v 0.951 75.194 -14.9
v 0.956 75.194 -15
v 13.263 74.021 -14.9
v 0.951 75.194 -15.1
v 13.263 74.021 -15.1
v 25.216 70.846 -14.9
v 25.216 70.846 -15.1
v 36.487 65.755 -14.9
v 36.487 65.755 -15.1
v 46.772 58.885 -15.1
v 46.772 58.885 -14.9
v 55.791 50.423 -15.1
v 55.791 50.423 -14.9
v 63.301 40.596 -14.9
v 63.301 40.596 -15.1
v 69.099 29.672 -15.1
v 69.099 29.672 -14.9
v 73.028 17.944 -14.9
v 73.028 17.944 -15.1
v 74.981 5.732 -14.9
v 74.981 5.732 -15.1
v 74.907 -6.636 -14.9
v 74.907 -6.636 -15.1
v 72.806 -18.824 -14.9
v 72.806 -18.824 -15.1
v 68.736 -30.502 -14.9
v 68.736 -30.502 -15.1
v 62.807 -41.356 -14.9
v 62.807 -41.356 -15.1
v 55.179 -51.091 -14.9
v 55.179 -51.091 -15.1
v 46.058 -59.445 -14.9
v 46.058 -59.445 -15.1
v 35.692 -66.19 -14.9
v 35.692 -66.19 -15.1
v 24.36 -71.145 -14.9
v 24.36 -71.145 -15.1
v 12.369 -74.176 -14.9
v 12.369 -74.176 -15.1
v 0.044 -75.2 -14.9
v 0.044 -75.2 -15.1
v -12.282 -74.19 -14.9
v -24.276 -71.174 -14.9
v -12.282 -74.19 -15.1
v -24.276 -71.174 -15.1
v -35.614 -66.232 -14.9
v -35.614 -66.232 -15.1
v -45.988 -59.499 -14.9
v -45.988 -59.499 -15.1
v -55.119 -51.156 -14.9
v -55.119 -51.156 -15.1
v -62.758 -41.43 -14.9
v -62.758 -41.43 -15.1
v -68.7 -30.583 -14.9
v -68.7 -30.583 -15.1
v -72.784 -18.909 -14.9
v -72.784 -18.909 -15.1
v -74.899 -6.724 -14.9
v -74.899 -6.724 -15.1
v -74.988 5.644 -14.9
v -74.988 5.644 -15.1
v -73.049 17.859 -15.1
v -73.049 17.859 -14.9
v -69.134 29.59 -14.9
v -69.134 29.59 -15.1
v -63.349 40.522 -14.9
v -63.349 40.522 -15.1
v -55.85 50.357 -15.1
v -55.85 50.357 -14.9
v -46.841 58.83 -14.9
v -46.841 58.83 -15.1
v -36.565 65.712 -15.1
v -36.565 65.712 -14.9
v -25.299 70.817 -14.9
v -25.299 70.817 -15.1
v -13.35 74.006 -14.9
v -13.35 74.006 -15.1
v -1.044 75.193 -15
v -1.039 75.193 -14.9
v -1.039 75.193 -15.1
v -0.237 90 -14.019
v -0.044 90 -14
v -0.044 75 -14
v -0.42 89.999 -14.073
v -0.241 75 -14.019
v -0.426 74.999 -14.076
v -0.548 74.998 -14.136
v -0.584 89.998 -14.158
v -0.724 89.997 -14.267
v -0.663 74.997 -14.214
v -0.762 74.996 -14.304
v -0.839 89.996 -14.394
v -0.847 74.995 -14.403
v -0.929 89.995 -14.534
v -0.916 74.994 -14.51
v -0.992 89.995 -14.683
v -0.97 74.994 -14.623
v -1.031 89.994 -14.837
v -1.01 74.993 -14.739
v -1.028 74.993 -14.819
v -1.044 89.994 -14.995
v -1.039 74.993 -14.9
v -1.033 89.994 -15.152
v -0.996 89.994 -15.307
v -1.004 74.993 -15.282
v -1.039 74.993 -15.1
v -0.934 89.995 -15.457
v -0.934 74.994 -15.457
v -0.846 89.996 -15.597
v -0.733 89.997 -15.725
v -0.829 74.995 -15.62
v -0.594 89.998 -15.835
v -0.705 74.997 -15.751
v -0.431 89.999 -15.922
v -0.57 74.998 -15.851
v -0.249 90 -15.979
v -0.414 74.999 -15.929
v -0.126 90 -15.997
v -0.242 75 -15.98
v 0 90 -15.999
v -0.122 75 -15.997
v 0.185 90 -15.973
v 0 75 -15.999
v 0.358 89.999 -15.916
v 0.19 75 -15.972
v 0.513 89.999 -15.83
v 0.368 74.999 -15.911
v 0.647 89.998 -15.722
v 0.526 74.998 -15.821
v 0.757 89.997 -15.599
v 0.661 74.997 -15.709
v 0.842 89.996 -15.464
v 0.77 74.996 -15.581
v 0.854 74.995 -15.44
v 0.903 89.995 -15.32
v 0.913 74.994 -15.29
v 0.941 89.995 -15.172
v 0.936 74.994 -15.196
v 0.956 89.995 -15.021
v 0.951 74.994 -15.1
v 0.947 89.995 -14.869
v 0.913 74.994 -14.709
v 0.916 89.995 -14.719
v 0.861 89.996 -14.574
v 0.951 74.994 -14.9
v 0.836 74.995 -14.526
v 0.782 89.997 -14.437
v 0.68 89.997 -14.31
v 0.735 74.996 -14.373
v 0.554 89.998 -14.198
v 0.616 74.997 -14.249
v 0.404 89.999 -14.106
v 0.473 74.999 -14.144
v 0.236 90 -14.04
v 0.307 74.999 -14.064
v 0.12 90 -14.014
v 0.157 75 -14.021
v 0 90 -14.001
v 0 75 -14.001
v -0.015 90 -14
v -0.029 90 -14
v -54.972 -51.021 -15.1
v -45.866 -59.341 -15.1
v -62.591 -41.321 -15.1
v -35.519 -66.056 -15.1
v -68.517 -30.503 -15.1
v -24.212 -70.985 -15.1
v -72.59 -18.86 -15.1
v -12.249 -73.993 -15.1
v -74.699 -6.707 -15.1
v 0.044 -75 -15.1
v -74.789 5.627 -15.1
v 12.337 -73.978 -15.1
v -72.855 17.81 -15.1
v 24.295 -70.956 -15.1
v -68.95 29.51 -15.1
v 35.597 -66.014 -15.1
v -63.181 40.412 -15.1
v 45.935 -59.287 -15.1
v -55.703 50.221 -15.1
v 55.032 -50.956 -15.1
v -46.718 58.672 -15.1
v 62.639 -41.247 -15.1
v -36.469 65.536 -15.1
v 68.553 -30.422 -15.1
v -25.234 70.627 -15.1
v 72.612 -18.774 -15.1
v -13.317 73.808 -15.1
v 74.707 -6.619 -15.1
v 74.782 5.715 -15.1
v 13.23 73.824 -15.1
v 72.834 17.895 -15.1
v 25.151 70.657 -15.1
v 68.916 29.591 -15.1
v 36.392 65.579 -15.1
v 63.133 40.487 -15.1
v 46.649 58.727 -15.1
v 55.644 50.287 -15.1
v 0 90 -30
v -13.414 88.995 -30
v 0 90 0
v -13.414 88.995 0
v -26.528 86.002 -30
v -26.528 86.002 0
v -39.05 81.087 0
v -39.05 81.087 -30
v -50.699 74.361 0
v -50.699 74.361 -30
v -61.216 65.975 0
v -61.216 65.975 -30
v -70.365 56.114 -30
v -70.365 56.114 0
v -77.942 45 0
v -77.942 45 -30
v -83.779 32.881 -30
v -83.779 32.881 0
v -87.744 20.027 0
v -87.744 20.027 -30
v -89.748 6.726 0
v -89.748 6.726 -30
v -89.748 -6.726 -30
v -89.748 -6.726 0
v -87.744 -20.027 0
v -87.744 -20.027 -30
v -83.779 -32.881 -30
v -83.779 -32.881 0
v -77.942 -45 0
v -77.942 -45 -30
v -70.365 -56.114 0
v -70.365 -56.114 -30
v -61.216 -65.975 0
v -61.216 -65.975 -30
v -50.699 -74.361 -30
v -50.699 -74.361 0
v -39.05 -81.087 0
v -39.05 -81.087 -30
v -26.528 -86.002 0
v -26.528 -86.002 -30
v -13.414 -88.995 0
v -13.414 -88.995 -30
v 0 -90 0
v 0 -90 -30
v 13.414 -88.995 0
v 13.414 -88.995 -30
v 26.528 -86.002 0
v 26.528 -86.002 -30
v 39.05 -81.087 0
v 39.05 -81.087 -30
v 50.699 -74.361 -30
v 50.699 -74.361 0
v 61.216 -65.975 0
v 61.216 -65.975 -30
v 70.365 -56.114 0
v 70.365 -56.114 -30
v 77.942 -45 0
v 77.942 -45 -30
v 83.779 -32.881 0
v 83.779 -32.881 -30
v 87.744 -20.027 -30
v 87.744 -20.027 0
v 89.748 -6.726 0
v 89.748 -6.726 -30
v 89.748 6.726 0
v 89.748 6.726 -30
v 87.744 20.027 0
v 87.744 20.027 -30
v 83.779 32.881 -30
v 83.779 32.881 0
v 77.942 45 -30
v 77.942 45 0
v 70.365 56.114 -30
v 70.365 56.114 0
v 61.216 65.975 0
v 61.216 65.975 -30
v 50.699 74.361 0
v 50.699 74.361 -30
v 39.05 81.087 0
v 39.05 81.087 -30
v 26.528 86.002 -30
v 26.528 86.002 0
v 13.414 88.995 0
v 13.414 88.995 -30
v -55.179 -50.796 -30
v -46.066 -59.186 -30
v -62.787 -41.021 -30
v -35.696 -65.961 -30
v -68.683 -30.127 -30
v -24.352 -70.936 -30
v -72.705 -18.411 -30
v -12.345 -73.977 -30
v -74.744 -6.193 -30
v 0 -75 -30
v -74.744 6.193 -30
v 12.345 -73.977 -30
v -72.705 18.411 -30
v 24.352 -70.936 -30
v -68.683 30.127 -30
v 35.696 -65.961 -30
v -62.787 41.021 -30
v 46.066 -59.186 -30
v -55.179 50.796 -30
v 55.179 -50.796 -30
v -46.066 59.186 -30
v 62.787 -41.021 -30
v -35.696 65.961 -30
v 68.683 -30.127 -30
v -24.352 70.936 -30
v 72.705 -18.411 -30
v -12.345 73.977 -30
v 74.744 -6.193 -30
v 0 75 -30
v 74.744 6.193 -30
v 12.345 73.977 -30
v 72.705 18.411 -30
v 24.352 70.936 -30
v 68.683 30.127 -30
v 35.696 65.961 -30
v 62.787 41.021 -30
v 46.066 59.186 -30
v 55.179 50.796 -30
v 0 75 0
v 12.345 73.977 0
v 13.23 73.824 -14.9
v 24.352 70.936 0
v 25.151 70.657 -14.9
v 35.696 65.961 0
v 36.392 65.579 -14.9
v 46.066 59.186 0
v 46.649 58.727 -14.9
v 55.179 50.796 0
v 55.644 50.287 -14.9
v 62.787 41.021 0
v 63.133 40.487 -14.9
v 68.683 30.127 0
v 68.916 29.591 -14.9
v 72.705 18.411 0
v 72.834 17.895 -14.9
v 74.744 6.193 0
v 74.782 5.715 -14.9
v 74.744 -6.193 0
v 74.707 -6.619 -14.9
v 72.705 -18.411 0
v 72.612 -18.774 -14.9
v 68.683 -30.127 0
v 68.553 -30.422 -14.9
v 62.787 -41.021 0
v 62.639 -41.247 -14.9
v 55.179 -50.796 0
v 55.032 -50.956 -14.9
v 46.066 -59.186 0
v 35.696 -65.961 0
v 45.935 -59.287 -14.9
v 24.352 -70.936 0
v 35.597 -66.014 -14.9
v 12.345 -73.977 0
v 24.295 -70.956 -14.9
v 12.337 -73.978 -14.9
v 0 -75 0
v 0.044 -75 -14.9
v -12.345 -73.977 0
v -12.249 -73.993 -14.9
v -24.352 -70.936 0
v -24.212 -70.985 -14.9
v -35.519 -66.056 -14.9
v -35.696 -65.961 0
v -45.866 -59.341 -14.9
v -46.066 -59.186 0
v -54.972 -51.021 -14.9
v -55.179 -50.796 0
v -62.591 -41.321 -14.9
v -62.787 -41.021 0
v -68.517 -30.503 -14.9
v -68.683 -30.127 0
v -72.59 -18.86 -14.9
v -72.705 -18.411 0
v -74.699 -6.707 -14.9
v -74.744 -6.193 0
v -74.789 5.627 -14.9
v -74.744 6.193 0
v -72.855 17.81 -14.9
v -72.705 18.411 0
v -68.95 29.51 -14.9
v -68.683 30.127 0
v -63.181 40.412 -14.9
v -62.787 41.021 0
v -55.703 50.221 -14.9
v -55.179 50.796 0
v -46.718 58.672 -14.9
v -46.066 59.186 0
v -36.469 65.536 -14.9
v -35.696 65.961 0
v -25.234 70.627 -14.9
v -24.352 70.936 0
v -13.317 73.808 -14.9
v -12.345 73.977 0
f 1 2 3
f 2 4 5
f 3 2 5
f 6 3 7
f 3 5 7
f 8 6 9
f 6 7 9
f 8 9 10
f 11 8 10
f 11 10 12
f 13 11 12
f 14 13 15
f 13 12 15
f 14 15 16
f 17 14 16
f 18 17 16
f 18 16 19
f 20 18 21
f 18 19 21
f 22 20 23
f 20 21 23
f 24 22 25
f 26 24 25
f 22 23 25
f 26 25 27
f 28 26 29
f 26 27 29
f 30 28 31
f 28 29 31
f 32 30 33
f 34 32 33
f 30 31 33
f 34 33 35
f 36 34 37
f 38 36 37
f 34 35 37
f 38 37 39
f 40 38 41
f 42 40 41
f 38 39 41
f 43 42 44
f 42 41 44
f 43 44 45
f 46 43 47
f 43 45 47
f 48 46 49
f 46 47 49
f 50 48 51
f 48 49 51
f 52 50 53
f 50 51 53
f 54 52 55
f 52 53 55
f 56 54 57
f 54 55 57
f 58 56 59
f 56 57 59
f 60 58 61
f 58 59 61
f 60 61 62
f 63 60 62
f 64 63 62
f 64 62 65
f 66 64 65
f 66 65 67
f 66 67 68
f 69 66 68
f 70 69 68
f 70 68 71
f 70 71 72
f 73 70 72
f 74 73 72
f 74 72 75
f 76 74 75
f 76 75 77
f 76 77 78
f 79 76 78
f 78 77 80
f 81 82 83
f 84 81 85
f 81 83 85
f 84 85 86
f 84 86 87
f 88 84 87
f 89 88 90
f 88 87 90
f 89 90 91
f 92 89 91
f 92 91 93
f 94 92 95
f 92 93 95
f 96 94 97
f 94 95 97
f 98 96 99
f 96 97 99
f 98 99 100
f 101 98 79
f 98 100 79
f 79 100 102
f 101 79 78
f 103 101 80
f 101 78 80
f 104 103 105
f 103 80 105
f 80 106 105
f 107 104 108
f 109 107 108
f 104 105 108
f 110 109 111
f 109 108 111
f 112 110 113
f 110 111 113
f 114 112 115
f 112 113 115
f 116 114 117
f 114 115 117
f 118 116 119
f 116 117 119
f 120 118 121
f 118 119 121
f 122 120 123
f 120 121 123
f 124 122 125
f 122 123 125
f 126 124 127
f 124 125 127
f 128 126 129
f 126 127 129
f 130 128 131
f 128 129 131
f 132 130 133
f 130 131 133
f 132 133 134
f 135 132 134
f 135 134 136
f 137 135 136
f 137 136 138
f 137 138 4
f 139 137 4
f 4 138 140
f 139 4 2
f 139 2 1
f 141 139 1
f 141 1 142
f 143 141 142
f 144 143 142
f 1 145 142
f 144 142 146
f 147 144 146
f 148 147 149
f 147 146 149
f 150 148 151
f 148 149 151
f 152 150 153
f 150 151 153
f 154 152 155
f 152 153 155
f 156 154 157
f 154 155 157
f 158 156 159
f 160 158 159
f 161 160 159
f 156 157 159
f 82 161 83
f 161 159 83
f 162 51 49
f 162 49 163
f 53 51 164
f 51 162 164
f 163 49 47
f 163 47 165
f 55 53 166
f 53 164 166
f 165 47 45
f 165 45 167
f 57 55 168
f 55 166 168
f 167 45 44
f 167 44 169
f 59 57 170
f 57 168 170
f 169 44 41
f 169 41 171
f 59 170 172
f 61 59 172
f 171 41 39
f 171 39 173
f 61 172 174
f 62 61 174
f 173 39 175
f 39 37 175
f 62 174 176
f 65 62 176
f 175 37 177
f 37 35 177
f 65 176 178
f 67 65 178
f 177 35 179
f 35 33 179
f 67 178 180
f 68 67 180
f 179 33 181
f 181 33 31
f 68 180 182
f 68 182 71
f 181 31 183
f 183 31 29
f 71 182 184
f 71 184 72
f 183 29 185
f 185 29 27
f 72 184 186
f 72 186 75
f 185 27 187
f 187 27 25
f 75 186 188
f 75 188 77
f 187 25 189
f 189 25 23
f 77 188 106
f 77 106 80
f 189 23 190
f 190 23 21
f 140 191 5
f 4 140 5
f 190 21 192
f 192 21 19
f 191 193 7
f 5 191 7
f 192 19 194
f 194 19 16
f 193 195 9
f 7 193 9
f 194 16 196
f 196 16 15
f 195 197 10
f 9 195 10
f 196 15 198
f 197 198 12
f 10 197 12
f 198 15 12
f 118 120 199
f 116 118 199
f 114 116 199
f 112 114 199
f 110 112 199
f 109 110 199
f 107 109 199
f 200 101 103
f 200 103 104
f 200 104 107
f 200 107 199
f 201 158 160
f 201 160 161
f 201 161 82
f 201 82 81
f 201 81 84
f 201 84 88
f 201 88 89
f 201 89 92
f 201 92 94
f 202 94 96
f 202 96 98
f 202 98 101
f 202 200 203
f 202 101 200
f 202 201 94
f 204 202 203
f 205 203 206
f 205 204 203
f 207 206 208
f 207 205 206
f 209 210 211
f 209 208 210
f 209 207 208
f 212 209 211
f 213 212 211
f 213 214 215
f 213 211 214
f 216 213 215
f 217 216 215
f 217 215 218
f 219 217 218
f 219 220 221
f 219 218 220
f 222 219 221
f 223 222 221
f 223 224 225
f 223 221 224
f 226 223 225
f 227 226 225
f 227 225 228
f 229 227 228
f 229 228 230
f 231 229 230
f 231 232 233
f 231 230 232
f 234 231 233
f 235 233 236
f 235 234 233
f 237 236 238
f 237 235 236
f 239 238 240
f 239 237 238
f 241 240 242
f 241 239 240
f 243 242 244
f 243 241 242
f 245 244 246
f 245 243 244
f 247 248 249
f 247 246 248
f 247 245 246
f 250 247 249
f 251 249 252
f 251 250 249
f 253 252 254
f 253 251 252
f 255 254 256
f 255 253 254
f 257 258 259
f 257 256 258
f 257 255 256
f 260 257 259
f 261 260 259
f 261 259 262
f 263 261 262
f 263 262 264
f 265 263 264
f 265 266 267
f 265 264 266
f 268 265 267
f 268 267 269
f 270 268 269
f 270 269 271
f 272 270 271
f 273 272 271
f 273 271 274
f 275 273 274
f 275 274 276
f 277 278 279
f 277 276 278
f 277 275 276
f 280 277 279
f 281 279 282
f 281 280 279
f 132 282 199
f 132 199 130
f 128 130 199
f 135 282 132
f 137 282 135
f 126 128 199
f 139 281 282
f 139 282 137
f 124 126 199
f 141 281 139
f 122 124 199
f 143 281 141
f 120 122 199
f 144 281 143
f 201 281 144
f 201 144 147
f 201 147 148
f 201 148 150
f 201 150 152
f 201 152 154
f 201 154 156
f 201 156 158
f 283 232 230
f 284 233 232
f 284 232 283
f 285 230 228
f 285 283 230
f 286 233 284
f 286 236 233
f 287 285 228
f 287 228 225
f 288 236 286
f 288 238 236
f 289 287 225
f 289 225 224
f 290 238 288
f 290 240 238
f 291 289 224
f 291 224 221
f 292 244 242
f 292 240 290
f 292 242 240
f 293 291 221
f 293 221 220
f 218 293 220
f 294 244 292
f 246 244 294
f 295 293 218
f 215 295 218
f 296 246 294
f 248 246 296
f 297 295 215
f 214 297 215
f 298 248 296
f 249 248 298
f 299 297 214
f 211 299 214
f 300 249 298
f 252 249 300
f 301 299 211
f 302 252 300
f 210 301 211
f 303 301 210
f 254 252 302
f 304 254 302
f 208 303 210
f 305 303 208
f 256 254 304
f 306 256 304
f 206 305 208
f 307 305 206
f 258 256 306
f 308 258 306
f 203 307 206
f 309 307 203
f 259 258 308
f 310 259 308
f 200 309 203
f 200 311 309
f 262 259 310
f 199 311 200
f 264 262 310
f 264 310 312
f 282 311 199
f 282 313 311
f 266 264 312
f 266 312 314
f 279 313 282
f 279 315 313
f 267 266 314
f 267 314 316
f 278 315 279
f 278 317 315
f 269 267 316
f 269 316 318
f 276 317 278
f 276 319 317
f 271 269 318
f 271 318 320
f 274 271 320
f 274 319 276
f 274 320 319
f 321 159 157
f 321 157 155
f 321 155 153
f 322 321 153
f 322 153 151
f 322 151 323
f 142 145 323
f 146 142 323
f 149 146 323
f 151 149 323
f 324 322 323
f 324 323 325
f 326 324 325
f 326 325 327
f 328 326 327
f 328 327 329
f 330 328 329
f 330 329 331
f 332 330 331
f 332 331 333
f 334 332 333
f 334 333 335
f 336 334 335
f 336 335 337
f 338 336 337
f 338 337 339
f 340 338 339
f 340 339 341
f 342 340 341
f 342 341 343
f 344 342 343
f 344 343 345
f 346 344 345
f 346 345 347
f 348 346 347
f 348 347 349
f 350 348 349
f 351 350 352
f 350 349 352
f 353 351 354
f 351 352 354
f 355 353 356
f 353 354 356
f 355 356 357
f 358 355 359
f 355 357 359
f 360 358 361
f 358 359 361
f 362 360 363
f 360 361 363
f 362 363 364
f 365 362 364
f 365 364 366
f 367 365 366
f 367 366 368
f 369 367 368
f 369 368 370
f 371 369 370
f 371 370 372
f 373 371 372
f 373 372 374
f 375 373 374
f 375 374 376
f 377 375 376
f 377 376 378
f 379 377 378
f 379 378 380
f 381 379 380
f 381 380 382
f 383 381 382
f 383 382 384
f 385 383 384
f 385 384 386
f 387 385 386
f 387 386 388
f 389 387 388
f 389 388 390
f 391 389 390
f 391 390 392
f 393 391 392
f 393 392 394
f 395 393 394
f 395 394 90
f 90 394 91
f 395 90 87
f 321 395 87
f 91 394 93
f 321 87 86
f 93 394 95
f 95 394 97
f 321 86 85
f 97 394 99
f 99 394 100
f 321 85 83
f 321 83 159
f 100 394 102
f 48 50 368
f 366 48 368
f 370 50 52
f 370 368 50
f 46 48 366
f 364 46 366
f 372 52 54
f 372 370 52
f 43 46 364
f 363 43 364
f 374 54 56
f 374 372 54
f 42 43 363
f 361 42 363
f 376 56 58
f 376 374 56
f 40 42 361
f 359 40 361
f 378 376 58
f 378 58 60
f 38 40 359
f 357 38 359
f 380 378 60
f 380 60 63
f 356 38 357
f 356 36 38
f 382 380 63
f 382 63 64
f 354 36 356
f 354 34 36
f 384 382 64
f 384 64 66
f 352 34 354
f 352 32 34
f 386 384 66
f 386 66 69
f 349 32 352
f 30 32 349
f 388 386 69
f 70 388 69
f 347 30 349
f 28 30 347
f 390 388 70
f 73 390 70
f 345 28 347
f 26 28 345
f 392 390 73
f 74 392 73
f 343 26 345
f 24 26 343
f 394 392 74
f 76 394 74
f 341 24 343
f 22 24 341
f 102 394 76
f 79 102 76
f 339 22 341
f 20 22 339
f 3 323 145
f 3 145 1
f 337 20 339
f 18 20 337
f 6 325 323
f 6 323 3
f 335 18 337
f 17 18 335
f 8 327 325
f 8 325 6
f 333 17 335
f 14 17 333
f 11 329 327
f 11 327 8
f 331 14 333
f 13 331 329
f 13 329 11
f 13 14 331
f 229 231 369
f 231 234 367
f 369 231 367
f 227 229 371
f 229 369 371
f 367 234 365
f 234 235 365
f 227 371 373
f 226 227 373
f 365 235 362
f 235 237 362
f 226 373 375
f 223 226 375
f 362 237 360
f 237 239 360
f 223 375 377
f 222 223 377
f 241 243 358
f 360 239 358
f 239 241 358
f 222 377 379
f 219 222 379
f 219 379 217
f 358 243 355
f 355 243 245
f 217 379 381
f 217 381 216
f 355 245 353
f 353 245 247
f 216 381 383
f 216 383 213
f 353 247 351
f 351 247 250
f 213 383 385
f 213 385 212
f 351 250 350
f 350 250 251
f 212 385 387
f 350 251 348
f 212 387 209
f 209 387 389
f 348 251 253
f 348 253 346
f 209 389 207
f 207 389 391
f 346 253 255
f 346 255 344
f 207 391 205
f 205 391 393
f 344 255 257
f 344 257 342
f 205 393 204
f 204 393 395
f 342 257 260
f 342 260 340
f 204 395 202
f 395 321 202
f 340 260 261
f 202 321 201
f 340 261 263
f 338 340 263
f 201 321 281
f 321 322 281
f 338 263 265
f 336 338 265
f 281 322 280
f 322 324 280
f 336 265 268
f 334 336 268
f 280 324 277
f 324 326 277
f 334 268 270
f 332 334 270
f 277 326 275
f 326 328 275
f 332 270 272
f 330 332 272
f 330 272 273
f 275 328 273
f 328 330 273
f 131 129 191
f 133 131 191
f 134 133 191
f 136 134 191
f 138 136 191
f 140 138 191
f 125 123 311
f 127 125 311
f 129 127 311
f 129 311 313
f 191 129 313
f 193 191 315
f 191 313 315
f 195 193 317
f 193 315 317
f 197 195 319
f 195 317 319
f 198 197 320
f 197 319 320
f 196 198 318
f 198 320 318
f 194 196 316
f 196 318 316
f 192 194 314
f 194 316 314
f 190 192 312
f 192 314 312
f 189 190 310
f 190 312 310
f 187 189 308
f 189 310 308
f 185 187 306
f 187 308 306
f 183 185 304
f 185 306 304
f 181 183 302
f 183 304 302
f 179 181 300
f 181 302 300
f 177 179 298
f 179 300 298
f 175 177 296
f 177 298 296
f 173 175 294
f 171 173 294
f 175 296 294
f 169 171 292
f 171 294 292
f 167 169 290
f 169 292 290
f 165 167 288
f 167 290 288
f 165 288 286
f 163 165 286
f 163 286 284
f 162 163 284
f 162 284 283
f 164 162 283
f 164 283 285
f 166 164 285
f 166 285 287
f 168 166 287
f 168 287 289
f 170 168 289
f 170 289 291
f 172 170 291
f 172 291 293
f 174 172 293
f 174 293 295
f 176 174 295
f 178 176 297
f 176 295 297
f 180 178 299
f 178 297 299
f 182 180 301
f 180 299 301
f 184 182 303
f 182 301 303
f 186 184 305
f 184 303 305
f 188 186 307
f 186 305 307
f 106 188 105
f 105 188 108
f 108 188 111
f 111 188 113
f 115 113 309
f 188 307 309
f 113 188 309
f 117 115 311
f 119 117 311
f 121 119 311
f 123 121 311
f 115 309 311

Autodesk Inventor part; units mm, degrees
ref_plane "YZ Plane" through (0, 0, 0) normal (1, 0, 0) x (0, 1, 0)
ref_plane "XY Plane" through (0, 0, 0) normal (0, 0, 1) x (1, 0, 0)
sketch "Sketch3" plane through (0, 0, 0) normal (1, 0, 0) x (0, 1, 0)
  line L0 (0, 0) -> (0, -30)
  line L1 (0, -30) -> (90, -30)
  line L2 (90, -30) -> (90, 0)
  line L3 (90, 0) -> (0, 0)
  line L4 (75, 0) -> (75, -14.9)
  line L5 (75, -14.9) -> (75.2, -14.9)
  line L6 (75.2, -14.9) -> (75.2, -15.1)
  line L7 (75.2, -15.1) -> (75, -15.1)
  line L8 (75, -15.1) -> (75, -30)
  dimension "d15" = 0.2
  dimension "d16" = 0.2
  dimension "d17" = 180
  dimension "d18" = 150
  dimension "d19" = 14.9
  dimension "d20" = 30
revolve "Revolution2" add sketch "Sketch3" angle 360 about axis through (0, 0, 0) along (0, 0, -1) contours L3 L2 L1 L8 L7 L6 L5 L4
ref_plane "Work Plane2" through (0, 90, 0) normal (0, 1, 0) x (-1, 0, 0)
sketch "Sketch4" plane through (0, 90, 0) normal (0, 1, 0) x (-1, 0, 0)
  line L0 (-75, -14.9) -> (75, -14.9) projected
  point P0 (0, 0)
  point P1 (0.0442, -15)
  dimension "d24" = 15
hole "Hole2" at (-0.0442, 90, -15) direction (0, -1, 0) diameter 2 depth 30 tip angle 118
properties part number "SFD_CuscinettoRadiale180x150x0.20" material "Stainless Steel"
